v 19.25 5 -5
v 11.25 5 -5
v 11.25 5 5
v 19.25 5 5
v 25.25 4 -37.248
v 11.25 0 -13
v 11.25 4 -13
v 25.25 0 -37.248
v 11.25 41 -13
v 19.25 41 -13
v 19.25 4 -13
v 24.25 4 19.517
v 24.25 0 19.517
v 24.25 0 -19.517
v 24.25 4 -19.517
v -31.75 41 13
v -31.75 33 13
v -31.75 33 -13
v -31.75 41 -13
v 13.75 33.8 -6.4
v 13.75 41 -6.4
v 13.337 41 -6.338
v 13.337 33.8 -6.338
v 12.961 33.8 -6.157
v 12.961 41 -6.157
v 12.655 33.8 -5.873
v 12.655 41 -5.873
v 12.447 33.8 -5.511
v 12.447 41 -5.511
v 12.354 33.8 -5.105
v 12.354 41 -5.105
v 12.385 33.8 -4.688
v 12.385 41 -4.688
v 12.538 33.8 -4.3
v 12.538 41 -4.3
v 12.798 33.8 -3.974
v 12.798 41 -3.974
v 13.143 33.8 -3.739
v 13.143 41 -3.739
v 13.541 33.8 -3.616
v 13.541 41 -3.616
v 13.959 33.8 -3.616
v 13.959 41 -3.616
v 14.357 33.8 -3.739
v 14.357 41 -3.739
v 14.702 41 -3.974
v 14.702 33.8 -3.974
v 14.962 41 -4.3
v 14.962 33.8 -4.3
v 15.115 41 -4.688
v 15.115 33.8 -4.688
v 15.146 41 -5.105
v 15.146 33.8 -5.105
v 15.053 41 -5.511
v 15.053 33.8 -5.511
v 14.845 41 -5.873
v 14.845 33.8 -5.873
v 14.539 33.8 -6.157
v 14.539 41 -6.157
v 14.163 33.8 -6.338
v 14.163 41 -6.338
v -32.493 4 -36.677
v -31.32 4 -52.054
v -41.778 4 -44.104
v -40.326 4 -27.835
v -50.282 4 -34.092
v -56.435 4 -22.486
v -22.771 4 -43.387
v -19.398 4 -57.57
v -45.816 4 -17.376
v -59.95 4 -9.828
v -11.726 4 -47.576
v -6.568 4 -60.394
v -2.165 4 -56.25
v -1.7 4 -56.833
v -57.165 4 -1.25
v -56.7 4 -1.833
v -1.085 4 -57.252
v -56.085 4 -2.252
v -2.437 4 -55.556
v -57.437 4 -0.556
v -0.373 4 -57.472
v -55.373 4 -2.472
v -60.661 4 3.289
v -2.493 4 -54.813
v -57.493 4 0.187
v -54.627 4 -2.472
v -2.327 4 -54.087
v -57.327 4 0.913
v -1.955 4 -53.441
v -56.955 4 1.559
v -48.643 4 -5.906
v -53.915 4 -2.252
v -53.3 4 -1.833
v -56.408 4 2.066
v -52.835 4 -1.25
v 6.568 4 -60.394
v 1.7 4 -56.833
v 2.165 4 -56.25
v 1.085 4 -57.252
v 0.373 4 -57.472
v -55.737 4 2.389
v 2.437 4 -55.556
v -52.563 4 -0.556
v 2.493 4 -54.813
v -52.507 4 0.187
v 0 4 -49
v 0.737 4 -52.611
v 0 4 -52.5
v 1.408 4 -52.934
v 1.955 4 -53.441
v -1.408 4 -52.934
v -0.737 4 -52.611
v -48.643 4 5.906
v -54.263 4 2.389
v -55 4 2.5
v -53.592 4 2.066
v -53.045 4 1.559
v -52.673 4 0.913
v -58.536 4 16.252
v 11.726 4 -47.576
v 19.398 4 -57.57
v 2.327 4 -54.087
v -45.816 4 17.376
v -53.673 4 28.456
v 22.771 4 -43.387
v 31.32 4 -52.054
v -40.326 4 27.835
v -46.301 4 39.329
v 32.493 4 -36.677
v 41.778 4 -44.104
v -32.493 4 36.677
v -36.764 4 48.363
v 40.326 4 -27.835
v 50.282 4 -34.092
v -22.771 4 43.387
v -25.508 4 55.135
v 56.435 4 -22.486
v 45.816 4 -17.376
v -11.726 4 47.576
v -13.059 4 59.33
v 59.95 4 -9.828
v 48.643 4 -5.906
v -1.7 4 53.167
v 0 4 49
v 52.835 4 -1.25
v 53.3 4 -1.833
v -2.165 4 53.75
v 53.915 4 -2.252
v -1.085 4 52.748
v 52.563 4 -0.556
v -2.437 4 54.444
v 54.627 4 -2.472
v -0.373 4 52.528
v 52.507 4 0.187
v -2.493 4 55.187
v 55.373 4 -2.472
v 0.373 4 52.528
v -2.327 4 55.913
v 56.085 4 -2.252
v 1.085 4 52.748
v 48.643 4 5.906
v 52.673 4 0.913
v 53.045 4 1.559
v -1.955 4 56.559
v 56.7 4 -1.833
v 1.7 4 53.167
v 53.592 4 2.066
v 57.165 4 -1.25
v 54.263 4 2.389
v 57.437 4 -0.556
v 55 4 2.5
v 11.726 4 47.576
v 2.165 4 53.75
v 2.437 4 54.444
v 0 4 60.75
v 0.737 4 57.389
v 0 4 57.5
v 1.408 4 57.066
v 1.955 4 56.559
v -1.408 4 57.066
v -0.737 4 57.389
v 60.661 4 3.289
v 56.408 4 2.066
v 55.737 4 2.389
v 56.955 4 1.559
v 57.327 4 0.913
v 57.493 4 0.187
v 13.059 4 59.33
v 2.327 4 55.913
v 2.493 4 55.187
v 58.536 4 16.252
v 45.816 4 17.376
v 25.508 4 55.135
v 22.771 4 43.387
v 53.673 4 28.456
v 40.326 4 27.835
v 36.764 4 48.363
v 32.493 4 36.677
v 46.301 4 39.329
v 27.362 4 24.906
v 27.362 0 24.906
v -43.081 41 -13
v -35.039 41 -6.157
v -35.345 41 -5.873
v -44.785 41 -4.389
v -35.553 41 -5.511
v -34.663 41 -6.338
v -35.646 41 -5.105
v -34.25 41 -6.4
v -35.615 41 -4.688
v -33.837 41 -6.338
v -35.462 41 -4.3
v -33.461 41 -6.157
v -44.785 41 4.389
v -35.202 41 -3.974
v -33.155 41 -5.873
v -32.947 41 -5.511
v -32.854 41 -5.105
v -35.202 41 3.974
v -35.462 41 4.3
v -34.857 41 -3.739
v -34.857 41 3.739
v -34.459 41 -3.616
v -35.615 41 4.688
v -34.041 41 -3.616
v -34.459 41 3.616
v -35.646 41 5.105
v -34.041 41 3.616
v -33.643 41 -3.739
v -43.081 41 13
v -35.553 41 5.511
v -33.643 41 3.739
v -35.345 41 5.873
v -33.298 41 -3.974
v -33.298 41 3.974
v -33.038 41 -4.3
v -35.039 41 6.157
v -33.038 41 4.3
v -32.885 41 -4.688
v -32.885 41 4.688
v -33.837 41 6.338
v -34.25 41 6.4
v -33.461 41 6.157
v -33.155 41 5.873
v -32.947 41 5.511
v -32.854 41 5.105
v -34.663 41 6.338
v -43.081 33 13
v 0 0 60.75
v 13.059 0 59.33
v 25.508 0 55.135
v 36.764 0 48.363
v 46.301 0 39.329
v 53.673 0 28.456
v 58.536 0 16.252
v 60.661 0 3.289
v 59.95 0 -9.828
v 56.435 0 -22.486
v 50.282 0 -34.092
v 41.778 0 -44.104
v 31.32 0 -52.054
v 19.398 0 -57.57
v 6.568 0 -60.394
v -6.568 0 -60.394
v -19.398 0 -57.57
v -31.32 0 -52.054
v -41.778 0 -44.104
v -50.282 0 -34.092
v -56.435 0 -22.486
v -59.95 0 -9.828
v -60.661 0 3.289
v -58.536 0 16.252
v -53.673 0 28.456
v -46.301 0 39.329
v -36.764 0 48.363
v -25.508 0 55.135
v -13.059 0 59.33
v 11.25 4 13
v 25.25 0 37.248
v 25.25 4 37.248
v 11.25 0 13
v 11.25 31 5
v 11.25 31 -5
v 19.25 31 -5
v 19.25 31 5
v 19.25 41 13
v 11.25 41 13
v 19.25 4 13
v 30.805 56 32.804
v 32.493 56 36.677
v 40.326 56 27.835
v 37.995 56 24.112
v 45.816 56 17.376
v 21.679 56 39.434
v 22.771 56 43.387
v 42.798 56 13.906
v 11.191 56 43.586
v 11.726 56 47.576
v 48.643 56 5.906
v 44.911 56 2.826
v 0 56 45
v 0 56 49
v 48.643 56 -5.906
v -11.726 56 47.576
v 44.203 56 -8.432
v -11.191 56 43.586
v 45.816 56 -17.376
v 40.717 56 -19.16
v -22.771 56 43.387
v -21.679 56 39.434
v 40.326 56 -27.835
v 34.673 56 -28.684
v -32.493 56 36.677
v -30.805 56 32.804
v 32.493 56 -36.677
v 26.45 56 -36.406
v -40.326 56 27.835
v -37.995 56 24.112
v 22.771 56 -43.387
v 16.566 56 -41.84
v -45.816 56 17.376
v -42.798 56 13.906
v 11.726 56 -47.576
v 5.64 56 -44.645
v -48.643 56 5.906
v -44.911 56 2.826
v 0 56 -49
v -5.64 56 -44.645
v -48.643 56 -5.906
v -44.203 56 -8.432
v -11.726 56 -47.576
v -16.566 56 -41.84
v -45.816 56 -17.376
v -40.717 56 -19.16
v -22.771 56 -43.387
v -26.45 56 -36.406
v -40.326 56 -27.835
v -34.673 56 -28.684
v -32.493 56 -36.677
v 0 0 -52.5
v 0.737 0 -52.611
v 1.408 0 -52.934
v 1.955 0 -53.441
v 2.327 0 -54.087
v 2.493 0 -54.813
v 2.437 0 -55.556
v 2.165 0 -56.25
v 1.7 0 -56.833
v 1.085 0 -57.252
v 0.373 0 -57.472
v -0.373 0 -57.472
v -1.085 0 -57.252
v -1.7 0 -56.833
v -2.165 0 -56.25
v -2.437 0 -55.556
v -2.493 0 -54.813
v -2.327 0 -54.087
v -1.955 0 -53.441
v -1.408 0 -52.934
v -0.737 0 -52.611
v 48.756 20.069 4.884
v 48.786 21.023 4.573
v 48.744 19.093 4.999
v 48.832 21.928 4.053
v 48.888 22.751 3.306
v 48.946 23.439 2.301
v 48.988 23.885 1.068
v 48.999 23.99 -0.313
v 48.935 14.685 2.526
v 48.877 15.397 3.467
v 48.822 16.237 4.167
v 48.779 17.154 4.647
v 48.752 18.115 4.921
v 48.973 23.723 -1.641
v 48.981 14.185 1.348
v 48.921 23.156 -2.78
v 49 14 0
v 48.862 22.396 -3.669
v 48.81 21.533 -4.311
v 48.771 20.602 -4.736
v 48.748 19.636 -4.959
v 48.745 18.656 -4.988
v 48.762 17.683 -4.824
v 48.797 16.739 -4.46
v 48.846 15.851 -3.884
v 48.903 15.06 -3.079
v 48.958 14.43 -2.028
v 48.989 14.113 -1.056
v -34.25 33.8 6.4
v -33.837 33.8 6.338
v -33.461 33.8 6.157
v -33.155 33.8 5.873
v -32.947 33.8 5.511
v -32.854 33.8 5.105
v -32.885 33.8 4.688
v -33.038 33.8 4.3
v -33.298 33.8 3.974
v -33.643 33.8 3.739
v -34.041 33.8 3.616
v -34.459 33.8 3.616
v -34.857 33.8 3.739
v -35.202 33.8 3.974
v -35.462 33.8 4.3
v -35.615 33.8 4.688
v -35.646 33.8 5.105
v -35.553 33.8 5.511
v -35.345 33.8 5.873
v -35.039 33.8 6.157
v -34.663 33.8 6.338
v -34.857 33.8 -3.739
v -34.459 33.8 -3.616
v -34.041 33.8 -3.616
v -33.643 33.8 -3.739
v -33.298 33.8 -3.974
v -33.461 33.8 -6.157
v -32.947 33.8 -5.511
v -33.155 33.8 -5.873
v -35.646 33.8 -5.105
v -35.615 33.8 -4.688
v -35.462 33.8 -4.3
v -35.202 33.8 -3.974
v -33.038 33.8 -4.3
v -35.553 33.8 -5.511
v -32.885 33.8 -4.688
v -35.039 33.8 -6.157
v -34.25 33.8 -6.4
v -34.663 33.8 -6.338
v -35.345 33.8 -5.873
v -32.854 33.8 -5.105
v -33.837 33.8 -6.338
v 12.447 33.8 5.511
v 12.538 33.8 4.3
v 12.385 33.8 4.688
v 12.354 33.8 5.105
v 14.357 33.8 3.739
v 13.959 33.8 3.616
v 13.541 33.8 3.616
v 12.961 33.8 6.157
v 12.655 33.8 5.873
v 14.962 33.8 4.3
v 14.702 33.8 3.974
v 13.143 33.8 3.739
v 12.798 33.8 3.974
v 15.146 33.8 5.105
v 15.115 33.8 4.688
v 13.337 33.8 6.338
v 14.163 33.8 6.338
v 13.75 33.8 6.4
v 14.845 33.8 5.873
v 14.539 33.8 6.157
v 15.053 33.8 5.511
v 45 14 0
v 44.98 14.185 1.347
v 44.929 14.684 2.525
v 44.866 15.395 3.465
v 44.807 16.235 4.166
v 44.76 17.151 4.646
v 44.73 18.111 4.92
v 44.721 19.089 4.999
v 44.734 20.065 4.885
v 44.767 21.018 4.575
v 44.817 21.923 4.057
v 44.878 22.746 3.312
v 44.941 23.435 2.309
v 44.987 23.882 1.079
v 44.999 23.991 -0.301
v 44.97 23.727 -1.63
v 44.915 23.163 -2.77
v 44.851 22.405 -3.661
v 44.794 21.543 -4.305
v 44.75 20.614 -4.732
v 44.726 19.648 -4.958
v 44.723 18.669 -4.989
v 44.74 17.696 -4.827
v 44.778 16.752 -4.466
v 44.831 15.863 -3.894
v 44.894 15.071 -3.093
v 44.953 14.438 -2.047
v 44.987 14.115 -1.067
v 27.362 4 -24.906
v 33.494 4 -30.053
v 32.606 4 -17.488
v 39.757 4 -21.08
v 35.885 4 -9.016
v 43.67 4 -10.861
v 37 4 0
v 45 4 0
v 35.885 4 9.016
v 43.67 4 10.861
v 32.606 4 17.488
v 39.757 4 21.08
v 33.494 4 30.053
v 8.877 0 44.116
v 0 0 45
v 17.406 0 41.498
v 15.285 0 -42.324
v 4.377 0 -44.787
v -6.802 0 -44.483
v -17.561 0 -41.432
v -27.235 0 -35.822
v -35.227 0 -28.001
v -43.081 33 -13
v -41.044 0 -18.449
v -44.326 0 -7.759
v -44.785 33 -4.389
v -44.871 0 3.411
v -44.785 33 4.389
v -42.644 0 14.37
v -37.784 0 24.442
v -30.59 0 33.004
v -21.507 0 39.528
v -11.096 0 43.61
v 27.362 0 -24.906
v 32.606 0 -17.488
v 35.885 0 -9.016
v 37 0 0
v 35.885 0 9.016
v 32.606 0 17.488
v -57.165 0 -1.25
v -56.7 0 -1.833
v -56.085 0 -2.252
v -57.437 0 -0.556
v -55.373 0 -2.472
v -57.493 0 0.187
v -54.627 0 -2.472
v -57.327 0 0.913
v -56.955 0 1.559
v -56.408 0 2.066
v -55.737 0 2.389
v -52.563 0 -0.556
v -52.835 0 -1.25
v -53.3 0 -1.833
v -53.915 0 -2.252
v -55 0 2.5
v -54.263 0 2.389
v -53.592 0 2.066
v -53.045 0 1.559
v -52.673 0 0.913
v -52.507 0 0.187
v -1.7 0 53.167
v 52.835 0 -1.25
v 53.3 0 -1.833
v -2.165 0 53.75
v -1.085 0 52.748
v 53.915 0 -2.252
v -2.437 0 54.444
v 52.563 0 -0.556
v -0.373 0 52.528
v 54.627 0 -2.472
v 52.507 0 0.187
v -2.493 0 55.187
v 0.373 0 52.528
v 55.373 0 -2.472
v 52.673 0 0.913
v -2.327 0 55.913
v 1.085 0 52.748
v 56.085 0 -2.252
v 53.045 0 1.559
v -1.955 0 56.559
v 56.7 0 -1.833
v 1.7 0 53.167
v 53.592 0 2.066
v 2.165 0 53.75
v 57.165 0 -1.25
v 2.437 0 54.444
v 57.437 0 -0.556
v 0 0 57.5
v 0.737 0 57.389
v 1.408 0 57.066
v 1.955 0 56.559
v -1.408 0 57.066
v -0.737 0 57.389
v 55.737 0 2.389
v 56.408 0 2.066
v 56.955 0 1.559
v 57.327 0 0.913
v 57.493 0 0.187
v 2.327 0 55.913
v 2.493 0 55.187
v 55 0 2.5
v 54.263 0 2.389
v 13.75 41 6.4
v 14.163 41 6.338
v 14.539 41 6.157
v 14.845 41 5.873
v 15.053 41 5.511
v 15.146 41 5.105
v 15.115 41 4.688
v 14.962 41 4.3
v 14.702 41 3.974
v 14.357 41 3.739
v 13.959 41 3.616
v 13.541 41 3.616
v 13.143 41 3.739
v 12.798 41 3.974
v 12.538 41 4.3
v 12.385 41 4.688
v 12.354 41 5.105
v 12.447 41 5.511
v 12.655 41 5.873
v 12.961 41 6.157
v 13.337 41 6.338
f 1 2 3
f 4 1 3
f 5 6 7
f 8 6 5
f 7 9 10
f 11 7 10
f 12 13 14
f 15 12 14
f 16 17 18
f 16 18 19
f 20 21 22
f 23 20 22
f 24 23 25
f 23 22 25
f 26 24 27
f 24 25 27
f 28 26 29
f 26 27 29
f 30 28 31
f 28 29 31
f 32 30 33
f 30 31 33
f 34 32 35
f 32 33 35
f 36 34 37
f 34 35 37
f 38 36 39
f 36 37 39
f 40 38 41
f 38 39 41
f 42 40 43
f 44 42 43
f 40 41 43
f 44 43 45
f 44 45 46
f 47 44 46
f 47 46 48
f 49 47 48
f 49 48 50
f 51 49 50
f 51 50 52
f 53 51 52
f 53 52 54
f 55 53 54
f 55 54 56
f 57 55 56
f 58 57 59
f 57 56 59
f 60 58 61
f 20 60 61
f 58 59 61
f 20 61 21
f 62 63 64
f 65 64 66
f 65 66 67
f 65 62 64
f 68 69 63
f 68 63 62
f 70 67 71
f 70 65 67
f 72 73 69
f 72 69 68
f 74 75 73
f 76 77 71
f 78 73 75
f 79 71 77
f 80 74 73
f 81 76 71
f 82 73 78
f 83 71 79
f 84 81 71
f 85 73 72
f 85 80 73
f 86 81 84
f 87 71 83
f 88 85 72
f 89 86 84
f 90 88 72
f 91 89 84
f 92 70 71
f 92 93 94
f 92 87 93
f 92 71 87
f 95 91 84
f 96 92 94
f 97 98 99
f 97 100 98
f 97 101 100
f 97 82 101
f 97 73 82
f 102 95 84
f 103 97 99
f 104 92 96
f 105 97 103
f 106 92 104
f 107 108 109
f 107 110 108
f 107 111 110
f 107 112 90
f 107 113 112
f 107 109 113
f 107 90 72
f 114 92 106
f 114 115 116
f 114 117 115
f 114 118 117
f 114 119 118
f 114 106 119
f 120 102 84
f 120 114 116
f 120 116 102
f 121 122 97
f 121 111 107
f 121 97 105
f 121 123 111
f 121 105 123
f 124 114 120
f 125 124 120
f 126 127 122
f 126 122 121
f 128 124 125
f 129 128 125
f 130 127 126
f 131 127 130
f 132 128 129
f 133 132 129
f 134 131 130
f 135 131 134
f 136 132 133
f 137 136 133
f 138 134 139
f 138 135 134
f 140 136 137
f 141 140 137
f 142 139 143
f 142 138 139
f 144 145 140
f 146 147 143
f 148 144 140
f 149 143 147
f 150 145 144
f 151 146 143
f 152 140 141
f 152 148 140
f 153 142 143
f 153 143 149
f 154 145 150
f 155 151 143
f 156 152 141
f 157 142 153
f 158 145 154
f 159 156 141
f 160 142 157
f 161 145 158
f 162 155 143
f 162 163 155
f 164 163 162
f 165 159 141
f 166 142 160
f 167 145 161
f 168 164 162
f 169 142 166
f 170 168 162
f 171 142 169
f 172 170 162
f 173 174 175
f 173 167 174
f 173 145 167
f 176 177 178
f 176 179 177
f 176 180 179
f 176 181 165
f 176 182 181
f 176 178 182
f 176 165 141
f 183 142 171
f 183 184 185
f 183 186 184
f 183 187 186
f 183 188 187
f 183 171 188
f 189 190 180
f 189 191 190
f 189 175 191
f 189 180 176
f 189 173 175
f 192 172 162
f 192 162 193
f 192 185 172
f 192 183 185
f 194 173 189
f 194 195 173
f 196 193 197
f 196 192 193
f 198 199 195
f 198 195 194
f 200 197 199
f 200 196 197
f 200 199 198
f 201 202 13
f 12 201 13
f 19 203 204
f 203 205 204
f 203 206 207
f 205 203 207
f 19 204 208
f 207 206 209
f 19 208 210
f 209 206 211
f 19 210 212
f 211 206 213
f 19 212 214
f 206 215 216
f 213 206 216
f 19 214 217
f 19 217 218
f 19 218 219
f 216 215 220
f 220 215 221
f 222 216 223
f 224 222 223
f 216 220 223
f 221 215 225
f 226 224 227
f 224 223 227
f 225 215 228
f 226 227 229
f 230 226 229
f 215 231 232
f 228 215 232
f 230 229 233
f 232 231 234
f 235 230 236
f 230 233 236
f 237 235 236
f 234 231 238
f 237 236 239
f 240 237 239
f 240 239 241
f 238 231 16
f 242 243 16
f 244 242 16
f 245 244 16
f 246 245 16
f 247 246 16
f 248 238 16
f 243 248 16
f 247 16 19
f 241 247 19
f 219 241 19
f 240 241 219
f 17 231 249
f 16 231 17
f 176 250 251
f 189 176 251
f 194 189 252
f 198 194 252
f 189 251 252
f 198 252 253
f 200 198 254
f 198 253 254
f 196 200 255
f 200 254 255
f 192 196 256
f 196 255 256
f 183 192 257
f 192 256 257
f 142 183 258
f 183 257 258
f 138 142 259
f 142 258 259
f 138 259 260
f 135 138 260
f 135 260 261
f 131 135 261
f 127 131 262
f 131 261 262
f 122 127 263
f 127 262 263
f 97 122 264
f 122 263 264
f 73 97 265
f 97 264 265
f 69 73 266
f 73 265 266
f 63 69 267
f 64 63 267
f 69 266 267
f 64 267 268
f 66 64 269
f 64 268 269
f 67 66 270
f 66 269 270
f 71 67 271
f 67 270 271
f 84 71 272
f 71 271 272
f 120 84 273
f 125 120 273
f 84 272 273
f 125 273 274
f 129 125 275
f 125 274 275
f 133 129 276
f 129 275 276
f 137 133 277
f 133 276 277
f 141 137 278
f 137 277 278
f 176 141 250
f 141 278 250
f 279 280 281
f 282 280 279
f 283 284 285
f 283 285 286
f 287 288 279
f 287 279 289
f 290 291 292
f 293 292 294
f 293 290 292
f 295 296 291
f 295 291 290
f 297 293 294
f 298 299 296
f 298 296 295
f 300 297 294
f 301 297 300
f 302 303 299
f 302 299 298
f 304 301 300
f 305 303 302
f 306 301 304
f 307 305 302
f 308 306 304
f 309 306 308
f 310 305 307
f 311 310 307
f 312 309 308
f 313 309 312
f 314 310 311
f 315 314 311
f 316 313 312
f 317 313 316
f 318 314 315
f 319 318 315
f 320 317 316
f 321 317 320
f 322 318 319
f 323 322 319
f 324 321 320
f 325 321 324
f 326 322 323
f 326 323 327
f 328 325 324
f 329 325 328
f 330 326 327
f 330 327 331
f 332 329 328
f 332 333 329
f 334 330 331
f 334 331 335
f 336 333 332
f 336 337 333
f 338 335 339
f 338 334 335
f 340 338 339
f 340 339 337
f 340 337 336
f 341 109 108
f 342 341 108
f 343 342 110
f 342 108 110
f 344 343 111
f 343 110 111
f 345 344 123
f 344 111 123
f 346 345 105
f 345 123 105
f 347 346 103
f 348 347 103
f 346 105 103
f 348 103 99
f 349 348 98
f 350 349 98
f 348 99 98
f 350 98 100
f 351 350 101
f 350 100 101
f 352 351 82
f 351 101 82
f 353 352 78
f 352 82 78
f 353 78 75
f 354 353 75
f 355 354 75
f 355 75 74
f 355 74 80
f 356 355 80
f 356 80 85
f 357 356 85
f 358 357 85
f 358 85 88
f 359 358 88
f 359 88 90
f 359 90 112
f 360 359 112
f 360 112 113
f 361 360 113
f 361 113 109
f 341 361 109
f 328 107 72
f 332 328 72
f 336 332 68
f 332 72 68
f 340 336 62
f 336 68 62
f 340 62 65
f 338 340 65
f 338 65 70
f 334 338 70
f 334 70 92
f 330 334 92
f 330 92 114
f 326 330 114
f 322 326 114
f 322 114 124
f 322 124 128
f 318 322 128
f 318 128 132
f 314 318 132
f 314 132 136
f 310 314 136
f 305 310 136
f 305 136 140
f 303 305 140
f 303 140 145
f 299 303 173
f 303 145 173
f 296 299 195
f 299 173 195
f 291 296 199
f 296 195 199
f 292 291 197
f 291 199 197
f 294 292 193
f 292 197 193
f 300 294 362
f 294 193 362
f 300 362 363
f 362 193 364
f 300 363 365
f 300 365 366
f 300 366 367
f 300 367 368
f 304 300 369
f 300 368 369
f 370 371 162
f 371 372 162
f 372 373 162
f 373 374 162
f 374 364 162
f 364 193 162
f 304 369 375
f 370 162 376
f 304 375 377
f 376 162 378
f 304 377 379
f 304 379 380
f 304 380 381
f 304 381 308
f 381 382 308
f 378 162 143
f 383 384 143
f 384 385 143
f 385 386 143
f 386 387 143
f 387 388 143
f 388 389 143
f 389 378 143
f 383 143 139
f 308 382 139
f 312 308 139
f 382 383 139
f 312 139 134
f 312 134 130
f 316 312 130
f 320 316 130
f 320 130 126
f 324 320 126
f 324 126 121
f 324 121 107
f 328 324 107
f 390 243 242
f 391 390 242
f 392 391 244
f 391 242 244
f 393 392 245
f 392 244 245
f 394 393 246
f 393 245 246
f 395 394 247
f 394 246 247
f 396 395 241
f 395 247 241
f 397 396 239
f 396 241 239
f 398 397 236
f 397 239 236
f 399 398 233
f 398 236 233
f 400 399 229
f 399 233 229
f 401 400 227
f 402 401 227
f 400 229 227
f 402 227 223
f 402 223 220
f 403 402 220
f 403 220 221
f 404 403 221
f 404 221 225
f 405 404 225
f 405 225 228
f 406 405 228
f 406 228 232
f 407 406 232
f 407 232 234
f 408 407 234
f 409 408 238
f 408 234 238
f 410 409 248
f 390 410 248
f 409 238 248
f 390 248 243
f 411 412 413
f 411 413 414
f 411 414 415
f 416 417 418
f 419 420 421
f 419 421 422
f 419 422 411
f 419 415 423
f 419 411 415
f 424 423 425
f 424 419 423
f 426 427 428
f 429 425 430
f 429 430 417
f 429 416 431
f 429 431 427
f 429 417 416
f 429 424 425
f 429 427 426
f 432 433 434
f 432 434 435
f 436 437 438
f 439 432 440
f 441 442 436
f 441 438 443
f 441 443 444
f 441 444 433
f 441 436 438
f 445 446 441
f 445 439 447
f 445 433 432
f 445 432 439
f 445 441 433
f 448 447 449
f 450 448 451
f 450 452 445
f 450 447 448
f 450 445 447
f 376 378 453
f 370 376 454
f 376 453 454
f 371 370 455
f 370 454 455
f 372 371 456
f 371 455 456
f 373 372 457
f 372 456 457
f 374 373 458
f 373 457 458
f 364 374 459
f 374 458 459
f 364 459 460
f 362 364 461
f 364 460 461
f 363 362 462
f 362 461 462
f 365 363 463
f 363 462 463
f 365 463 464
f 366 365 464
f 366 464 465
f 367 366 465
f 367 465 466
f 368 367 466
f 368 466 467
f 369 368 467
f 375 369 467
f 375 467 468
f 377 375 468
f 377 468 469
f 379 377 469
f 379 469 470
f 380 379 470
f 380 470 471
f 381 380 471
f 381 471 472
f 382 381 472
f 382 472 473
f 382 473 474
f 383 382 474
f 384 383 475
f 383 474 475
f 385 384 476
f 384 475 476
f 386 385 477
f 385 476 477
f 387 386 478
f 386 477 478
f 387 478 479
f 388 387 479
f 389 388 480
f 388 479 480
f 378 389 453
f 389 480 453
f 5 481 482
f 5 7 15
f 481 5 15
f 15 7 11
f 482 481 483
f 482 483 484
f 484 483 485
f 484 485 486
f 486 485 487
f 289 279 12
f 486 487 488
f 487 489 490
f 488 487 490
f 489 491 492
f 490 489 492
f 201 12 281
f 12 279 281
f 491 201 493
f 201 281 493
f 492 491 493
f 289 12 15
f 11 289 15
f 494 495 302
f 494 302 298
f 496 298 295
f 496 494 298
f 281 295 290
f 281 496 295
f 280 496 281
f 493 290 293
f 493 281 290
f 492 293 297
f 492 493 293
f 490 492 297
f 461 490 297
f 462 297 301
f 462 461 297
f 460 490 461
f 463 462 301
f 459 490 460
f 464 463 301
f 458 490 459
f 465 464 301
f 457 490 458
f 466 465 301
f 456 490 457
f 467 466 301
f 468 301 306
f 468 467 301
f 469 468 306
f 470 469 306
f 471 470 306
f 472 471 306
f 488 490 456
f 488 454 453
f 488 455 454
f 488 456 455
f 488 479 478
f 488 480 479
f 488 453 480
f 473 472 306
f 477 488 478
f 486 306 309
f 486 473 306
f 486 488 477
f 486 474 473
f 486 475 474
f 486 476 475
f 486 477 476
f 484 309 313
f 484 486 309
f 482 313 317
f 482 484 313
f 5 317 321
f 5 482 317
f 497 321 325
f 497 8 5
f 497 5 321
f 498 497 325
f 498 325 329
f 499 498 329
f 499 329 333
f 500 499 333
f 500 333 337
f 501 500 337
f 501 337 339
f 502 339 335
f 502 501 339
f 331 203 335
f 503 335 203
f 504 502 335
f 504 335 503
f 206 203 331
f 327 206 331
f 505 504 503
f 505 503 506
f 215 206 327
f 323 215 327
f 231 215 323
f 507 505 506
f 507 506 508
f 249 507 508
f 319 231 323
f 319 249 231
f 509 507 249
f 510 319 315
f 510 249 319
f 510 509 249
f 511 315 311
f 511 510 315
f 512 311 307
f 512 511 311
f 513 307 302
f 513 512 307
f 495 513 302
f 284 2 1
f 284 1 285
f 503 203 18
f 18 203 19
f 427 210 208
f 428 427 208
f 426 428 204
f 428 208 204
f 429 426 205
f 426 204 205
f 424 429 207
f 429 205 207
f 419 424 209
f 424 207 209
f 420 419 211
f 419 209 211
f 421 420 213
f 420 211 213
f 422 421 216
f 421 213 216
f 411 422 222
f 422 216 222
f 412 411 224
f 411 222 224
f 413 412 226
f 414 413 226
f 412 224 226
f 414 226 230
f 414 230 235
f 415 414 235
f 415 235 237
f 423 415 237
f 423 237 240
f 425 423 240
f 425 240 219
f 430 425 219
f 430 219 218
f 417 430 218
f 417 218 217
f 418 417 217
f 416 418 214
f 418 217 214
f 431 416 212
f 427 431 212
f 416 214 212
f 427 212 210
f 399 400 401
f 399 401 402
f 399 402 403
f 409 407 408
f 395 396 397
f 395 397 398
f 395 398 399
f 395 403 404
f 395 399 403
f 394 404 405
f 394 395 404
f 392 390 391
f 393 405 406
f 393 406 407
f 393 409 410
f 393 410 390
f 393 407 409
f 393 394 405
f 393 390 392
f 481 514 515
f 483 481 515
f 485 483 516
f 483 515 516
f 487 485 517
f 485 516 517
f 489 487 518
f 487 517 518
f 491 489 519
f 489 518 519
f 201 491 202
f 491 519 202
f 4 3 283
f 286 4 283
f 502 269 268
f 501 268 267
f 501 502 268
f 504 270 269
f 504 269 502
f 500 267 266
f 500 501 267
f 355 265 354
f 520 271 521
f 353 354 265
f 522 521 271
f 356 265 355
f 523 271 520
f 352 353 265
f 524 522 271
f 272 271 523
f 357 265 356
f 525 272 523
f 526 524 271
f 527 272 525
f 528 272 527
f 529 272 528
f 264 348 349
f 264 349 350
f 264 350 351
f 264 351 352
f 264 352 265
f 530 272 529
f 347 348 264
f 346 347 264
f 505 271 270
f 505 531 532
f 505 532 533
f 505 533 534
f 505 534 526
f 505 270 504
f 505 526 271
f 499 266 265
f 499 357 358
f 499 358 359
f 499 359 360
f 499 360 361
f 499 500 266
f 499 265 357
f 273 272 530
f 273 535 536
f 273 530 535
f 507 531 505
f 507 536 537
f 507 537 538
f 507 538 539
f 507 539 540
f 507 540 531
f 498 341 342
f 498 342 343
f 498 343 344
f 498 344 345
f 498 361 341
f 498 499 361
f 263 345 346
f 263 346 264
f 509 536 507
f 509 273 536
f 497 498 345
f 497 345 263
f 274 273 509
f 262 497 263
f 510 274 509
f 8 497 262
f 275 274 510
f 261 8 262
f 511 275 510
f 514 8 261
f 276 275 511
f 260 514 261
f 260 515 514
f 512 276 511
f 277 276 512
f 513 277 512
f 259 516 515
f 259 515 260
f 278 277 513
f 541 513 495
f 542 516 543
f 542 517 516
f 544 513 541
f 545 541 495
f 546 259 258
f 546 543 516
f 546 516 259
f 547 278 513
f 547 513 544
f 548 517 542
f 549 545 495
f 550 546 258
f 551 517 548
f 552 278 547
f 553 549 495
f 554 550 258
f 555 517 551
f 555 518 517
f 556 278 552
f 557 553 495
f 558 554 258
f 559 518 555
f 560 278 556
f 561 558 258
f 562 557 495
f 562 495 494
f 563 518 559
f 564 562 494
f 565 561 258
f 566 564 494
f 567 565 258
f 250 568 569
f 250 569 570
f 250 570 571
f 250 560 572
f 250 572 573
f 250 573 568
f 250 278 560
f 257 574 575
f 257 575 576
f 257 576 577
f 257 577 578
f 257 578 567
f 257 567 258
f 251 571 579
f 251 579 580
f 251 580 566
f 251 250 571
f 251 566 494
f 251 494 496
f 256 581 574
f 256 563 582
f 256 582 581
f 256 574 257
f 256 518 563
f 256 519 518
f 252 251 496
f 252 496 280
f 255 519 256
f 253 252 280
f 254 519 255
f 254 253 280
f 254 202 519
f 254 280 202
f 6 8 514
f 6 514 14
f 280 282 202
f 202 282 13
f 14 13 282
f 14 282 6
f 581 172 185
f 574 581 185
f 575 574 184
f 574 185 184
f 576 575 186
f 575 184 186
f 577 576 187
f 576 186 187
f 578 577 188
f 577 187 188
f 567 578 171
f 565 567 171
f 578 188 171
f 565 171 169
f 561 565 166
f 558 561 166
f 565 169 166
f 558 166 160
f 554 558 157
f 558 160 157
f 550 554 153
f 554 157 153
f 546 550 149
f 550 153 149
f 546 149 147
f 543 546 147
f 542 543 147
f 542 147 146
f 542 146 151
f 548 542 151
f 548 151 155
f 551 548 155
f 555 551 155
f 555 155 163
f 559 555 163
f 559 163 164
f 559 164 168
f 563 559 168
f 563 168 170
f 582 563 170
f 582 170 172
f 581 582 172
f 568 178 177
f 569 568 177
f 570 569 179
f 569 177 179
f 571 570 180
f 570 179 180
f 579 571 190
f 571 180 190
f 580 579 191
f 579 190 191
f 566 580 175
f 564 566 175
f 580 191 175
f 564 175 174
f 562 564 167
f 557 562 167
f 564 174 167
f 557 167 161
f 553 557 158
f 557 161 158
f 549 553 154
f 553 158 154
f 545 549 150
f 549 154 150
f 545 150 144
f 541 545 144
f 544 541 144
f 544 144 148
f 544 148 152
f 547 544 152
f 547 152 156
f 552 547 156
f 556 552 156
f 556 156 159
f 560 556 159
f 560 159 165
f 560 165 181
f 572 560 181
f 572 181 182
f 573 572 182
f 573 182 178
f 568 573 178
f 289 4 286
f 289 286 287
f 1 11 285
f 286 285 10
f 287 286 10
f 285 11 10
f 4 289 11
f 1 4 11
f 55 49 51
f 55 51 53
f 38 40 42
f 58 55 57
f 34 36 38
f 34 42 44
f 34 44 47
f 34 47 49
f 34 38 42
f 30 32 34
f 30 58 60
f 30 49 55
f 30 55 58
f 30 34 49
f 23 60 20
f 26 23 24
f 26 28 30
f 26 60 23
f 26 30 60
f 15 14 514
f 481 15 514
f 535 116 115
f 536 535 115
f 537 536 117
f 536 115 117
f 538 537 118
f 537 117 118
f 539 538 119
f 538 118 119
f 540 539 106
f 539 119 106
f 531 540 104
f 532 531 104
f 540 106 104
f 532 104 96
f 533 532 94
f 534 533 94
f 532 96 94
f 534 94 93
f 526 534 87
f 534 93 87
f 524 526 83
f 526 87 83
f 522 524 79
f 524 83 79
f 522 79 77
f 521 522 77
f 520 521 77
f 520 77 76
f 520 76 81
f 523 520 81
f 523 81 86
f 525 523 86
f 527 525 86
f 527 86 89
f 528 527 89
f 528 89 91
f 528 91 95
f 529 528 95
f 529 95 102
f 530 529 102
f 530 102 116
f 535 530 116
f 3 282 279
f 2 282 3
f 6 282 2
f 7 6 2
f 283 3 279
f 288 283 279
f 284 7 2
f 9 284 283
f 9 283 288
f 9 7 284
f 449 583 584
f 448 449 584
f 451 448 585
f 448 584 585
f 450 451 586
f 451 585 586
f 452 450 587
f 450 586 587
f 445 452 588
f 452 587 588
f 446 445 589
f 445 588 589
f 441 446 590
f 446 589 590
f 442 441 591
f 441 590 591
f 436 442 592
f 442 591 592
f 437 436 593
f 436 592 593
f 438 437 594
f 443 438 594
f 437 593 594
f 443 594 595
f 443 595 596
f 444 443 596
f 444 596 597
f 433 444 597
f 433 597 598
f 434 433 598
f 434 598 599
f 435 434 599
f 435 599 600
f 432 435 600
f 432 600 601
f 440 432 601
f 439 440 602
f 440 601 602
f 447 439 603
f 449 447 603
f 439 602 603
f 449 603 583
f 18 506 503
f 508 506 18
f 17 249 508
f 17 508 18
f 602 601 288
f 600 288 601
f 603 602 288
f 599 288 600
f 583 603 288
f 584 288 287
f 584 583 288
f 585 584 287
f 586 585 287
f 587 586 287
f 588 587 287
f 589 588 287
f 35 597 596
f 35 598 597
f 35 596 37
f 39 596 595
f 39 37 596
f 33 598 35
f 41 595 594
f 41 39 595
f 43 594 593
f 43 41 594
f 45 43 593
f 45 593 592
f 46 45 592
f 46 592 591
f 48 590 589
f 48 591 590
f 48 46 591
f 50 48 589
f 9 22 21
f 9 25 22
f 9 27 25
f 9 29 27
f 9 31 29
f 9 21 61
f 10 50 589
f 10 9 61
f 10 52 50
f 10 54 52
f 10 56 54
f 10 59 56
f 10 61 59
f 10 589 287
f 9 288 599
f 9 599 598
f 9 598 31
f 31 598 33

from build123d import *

# Parameters (mm, degrees)
SKETCH1_R           = 60.75
SKETCH1_R_2         = 45
BOSS_EXTRUDE1_DEPTH = 4
SKETCH2_R           = 49
SKETCH2_R_2         = 45
BOSS_EXTRUDE2_DEPTH = 52
SKETCH4_W           = 8
SKETCH4_H           = 41
SKETCH4_W_2         = 15
SKETCH4_H_2         = 8
BOSS_EXTRUDE3_DEPTH = 13
SKETCH6_W           = 10
SKETCH6_H           = 26
CUT_EXTRUDE1_DEPTH  = 26
SKETCH7_R           = 5
CUT_EXTRUDE2_DEPTH  = 110.592711893
SKETCH8_R           = 1.4
CUT_EXTRUDE7_DEPTH  = 7.2
BOSS_EXTRUDE4_DEPTH = 4
SKETCH12_R          = 2.5
CUT_EXTRUDE8_DEPTH  = 101.424723103


with BuildPart() as part:
    # Sketch1 → Boss-Extrude1 (new body)
    with BuildSketch(Plane(origin=(0, 0, 0), x_dir=(1, 0, 0), z_dir=(0, 1, 0))):
        with Locations(Location((0, 0, 0), (0, 0, 270))):
            Circle(SKETCH1_R)
        with Locations(Location((0, 0, 0), (0, 0, 270))):
            Circle(SKETCH1_R_2, mode=Mode.SUBTRACT)
    extrude(amount=BOSS_EXTRUDE1_DEPTH)

    # Sketch2 → Boss-Extrude2 (add)
    with BuildSketch(Plane(origin=(0, 4, 0), x_dir=(1, 0, 0), z_dir=(0, 1, 0))):
        with Locations(Location((0, 0, 0), (0, 0, 90))):
            Circle(SKETCH2_R)
        with Locations(Location((0, 0, 0), (0, 0, 270))):
            Circle(SKETCH2_R_2, mode=Mode.SUBTRACT)
    extrude(amount=BOSS_EXTRUDE2_DEPTH)

    # Sketch4 → Boss-Extrude3 (add, symmetric)
    with BuildSketch(Plane.XY):
        with Locations((15.25, 20.5)):
            Rectangle(SKETCH4_W, SKETCH4_H)
        with Locations((-39.25, 37)):
            Rectangle(SKETCH4_W_2, SKETCH4_H_2)
    extrude(amount=BOSS_EXTRUDE3_DEPTH, both=True)


with BuildPart() as boss_extrude3_piece_1:
    # of the separate pieces the step leaves, piece 1, a body of its own (boss_extrude3_pieces)
    add(part.part.solids().sort_by_distance((0, 0, 60.75))[0])

    # Sketch7 → Cut-Extrude2 (cut, through all)
    with BuildSketch(Plane.ZY.offset(-11.25)):
        with Locations(Location((0, 19, 0), (0, 0, 270))):
            Circle(SKETCH7_R)
    extrude(amount=-CUT_EXTRUDE2_DEPTH, mode=Mode.SUBTRACT)


with BuildPart() as boss_extrude3_piece_2:
    # of the separate pieces the step leaves, piece 2, a body of its own (boss_extrude3_pieces)
    add(part.part.solids().sort_by_distance((11.25, 41, -13))[0])

    # Sketch6 → Cut-Extrude1 (cut)
    with BuildSketch(Plane.ZY.offset(-11.25)):
        with Locations((0, 18)):
            Rectangle(SKETCH6_W, SKETCH6_H)
    extrude(amount=-CUT_EXTRUDE1_DEPTH, mode=Mode.SUBTRACT)


with BuildPart() as cut_extrude7_tool:
    # Sketch8 → Cut-Extrude7 (new body)
    with BuildSketch(Plane(origin=(0, 41, 0), x_dir=(1, 0, 0), z_dir=(0, 1, 0))):
        with Locations(Location((-34.25, -5, 0), (0, 0, 270))):
            Circle(SKETCH8_R)
        with Locations(Location((13.75, -5, 0), (0, 0, 270))):
            Circle(SKETCH8_R)
        with Locations(Location((13.75, 5, 0), (0, 0, 90))):
            Circle(SKETCH8_R)
        with Locations(Location((-34.25, 5, 0), (0, 0, 90))):
            Circle(SKETCH8_R)
    extrude(amount=-CUT_EXTRUDE7_DEPTH)


with BuildPart() as boss_extrude3_piece_1_1:
    add(boss_extrude3_piece_1.part)

    # Cut-Extrude7: cut by cut_extrude7_tool
    add(cut_extrude7_tool.part, mode=Mode.SUBTRACT)



with BuildPart() as boss_extrude3_piece_2_1:
    add(boss_extrude3_piece_2.part)

    # Cut-Extrude7: cut by cut_extrude7_tool
    add(cut_extrude7_tool.part, mode=Mode.SUBTRACT)


with BuildPart() as boss_extrude3_piece_1_2:
    add(boss_extrude3_piece_1_1.part)

    add(boss_extrude3_piece_2_1.part)  # Boss-Extrude4 merges Boss-Extrude3 piece 2
    # Sketch9 → Boss-Extrude4 (add)
    with BuildSketch(Plane.XZ):
        with BuildLine():
            Line((11.25, -13), (25.249838503, -37.248431585))
            ThreePointArc((25.249838503, -37.248431585), (45, 0), (25.249838503, 37.248431585))
            Line((25.249838503, 37.248431585), (11.25, 13))
            Line((11.25, 13), (19.25, 13))
            Line((19.25, 13), (19.25, -13))
            Line((19.25, -13), (11.25, -13))
        make_face()
        with BuildLine():
            ThreePointArc((27.361802413, -24.906460381), (37, 0), (27.361802413, 24.906460381))
            Line((27.361802413, 24.906460381), (24.25, 19.516660498))
            Line((24.25, 19.516660498), (24.25, -19.516660498))
            Line((24.25, -19.516660498), (27.361802413, -24.906460381))
        make_face(mode=Mode.SUBTRACT)
    extrude(amount=-BOSS_EXTRUDE4_DEPTH)

    # Sketch12 → Cut-Extrude8 (cut, through all)
    with BuildSketch(Plane(origin=(0, 4, 0), x_dir=(1, 0, 0), z_dir=(0, 1, 0))):
        with Locations(Location((-55, 0, 0), (0, 0, 270))):
            Circle(SKETCH12_R)
        with Locations(Location((0, 55, 0), (0, 0, 270))):
            Circle(SKETCH12_R)
        with Locations(Location((55, 0, 0), (0, 0, 270))):
            Circle(SKETCH12_R)
        with Locations(Location((0, -55, 0), (0, 0, 270))):
            Circle(SKETCH12_R)
    extrude(amount=-CUT_EXTRUDE8_DEPTH, mode=Mode.SUBTRACT)


solid = boss_extrude3_piece_1_2.part
